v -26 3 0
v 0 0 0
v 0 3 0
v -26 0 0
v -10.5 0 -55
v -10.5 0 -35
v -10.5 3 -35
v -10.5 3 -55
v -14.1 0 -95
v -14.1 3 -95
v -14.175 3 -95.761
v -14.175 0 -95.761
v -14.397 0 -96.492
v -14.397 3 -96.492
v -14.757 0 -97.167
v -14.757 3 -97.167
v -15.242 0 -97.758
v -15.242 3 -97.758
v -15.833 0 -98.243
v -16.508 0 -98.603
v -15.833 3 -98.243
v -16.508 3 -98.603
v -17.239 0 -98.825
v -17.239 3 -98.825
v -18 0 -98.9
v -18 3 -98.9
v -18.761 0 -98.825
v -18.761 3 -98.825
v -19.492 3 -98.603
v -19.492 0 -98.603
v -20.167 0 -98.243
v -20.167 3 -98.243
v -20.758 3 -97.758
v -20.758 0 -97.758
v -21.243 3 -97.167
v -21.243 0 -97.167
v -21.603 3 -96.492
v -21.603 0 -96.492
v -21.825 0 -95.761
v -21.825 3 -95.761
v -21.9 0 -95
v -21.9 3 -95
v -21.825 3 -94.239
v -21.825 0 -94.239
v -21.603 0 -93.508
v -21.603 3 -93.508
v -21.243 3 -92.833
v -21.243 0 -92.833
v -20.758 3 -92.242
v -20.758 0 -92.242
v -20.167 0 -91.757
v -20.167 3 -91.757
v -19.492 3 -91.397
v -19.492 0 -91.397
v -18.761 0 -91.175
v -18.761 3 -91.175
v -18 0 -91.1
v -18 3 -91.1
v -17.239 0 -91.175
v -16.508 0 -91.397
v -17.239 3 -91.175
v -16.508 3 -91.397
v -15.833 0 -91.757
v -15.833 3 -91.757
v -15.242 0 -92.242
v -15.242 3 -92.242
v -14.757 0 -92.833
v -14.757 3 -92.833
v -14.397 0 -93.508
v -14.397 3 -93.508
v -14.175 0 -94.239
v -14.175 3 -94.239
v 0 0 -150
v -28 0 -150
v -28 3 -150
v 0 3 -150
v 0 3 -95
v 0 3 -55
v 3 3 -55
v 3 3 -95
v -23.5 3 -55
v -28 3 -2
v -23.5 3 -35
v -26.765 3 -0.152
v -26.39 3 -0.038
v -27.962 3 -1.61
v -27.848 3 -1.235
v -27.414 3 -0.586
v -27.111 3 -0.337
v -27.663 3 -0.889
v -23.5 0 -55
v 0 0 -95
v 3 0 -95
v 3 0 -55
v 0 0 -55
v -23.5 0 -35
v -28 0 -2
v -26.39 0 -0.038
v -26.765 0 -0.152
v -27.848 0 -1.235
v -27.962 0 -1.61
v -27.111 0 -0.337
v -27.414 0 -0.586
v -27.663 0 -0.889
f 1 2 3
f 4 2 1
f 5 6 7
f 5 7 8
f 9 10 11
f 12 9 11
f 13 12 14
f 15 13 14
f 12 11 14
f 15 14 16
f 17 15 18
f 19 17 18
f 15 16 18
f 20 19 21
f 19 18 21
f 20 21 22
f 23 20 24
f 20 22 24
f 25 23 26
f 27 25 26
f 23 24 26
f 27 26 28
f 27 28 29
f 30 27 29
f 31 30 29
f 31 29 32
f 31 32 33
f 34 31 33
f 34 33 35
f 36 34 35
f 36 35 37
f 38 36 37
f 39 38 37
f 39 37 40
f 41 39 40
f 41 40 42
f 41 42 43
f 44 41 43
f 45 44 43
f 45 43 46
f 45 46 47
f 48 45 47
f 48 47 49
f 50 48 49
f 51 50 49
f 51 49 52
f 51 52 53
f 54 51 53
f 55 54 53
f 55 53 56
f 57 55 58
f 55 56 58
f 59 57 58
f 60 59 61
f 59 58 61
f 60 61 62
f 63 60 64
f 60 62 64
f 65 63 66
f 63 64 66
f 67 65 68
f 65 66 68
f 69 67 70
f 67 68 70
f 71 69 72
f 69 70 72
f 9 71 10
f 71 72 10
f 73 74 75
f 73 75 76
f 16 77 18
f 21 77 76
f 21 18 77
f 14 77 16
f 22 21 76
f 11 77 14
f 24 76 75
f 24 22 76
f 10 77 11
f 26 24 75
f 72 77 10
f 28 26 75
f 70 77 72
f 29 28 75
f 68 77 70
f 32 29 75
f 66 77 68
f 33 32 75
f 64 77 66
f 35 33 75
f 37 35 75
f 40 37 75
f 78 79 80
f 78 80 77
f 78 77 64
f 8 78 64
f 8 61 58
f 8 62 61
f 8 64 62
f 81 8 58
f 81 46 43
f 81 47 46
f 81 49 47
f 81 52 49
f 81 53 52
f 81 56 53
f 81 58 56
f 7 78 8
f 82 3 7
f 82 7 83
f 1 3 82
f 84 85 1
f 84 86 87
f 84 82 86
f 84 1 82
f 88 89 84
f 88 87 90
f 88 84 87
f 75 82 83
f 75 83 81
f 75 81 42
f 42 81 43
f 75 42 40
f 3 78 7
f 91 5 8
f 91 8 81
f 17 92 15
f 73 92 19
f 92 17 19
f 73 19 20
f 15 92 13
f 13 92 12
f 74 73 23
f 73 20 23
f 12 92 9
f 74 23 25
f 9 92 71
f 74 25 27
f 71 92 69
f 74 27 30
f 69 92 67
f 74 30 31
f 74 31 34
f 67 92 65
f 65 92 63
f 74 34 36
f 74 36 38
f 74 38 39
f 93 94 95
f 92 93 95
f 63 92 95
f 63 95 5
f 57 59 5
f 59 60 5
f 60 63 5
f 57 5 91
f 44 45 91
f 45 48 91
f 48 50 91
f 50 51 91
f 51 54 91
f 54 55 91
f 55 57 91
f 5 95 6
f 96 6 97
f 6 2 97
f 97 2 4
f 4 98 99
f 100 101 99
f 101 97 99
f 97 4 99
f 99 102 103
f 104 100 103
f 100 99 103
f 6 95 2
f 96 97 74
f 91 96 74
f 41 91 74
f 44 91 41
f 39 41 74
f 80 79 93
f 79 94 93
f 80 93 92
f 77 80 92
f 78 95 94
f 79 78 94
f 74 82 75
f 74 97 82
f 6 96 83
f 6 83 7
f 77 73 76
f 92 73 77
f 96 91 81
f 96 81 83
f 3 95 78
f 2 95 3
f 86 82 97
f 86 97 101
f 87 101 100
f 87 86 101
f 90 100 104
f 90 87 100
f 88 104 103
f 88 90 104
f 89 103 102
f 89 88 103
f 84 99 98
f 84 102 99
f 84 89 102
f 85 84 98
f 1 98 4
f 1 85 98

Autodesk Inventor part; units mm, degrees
ref_plane "YZ Plane" through (0, 0, 0) normal (1, 0, 0) x (0, 1, 0)
ref_plane "XZ Plane" through (0, 0, 0) normal (0, 1, 0) x (-1, 0, 0)
ref_plane "XY Plane" through (0, 0, 0) normal (0, 0, 1) x (1, 0, 0)
sketch "Sketch1" plane through (0, 0, 0) normal (0, 1, 0) x (-1, 0, 0)
  line L0 (0, 0) -> (28, 0)
  line L1 (28, 0) -> (28, -150)
  line L2 (28, -150) -> (0, -150)
  line L3 (0, -150) -> (0, 0)
  line L4 (0, -55) -> (-3, -55)
  line L5 (-3, -55) -> (-3, -95)
  line L6 (-3, -95) -> (0, -95)
  line L7 (0, -95) -> (0, -55)
  line L8 (28, -75) -> (0, -75) construction
  line L9 (-3, -75) -> (0, -75) construction
  point P0 (0, -95)
  dimension "d0" = 150
  dimension "d1" = 3
  dimension "d2" = 40
  dimension "d3" = 28
extrude "Extrusion1" add sketch "Sketch1" along normal blind 3
sketch "Sketch3" plane through (0, 3, 0) normal (0, 1, 0) x (1, 0, 0)
  circle A0 centre (-18, 95) radius 3.9
  line L0 (-28, 150) -> (-28, 0) projected
  line L1 (0, 95) -> (0, 150) projected
  line L2 (-28, 0) -> (0, 0) projected
  line L3 (0, 150) -> (-28, 150) projected
  dimension "d18" = 7.8
  dimension "d20" = 18
  dimension "d24" = 55
extrude "Extrusion3" cut sketch "Sketch3" against normal blind 3
sketch "Sketch4" plane through (0, 0, 0) normal (0, -1, 0) x (1, 0, 0)
  line L0 (-10.5, -55) -> (-23.5, -55)
  line L1 (-23.5, -55) -> (-23.5, -35)
  line L2 (-23.5, -35) -> (-10.5, -35)
  line L3 (-10.5, -35) -> (-10.5, -55)
  line L4 (-10.5, -55) -> (-23.5, -35) construction
  line L5 (-23.5, -55) -> (-10.5, -35) construction
  line L6 (-28, 0) -> (0, 0) projected
  point P0 (-17, -45)
  dimension "d25" = 20
  dimension "d26" = 13
  dimension "d27" = 45
extrude "Extrusion4" cut sketch "Sketch4" against normal blind 10
fillet "Fillet1" radius 2 1 edges at (-28, 1.5, 0)
properties part number "Lateral BNC"
